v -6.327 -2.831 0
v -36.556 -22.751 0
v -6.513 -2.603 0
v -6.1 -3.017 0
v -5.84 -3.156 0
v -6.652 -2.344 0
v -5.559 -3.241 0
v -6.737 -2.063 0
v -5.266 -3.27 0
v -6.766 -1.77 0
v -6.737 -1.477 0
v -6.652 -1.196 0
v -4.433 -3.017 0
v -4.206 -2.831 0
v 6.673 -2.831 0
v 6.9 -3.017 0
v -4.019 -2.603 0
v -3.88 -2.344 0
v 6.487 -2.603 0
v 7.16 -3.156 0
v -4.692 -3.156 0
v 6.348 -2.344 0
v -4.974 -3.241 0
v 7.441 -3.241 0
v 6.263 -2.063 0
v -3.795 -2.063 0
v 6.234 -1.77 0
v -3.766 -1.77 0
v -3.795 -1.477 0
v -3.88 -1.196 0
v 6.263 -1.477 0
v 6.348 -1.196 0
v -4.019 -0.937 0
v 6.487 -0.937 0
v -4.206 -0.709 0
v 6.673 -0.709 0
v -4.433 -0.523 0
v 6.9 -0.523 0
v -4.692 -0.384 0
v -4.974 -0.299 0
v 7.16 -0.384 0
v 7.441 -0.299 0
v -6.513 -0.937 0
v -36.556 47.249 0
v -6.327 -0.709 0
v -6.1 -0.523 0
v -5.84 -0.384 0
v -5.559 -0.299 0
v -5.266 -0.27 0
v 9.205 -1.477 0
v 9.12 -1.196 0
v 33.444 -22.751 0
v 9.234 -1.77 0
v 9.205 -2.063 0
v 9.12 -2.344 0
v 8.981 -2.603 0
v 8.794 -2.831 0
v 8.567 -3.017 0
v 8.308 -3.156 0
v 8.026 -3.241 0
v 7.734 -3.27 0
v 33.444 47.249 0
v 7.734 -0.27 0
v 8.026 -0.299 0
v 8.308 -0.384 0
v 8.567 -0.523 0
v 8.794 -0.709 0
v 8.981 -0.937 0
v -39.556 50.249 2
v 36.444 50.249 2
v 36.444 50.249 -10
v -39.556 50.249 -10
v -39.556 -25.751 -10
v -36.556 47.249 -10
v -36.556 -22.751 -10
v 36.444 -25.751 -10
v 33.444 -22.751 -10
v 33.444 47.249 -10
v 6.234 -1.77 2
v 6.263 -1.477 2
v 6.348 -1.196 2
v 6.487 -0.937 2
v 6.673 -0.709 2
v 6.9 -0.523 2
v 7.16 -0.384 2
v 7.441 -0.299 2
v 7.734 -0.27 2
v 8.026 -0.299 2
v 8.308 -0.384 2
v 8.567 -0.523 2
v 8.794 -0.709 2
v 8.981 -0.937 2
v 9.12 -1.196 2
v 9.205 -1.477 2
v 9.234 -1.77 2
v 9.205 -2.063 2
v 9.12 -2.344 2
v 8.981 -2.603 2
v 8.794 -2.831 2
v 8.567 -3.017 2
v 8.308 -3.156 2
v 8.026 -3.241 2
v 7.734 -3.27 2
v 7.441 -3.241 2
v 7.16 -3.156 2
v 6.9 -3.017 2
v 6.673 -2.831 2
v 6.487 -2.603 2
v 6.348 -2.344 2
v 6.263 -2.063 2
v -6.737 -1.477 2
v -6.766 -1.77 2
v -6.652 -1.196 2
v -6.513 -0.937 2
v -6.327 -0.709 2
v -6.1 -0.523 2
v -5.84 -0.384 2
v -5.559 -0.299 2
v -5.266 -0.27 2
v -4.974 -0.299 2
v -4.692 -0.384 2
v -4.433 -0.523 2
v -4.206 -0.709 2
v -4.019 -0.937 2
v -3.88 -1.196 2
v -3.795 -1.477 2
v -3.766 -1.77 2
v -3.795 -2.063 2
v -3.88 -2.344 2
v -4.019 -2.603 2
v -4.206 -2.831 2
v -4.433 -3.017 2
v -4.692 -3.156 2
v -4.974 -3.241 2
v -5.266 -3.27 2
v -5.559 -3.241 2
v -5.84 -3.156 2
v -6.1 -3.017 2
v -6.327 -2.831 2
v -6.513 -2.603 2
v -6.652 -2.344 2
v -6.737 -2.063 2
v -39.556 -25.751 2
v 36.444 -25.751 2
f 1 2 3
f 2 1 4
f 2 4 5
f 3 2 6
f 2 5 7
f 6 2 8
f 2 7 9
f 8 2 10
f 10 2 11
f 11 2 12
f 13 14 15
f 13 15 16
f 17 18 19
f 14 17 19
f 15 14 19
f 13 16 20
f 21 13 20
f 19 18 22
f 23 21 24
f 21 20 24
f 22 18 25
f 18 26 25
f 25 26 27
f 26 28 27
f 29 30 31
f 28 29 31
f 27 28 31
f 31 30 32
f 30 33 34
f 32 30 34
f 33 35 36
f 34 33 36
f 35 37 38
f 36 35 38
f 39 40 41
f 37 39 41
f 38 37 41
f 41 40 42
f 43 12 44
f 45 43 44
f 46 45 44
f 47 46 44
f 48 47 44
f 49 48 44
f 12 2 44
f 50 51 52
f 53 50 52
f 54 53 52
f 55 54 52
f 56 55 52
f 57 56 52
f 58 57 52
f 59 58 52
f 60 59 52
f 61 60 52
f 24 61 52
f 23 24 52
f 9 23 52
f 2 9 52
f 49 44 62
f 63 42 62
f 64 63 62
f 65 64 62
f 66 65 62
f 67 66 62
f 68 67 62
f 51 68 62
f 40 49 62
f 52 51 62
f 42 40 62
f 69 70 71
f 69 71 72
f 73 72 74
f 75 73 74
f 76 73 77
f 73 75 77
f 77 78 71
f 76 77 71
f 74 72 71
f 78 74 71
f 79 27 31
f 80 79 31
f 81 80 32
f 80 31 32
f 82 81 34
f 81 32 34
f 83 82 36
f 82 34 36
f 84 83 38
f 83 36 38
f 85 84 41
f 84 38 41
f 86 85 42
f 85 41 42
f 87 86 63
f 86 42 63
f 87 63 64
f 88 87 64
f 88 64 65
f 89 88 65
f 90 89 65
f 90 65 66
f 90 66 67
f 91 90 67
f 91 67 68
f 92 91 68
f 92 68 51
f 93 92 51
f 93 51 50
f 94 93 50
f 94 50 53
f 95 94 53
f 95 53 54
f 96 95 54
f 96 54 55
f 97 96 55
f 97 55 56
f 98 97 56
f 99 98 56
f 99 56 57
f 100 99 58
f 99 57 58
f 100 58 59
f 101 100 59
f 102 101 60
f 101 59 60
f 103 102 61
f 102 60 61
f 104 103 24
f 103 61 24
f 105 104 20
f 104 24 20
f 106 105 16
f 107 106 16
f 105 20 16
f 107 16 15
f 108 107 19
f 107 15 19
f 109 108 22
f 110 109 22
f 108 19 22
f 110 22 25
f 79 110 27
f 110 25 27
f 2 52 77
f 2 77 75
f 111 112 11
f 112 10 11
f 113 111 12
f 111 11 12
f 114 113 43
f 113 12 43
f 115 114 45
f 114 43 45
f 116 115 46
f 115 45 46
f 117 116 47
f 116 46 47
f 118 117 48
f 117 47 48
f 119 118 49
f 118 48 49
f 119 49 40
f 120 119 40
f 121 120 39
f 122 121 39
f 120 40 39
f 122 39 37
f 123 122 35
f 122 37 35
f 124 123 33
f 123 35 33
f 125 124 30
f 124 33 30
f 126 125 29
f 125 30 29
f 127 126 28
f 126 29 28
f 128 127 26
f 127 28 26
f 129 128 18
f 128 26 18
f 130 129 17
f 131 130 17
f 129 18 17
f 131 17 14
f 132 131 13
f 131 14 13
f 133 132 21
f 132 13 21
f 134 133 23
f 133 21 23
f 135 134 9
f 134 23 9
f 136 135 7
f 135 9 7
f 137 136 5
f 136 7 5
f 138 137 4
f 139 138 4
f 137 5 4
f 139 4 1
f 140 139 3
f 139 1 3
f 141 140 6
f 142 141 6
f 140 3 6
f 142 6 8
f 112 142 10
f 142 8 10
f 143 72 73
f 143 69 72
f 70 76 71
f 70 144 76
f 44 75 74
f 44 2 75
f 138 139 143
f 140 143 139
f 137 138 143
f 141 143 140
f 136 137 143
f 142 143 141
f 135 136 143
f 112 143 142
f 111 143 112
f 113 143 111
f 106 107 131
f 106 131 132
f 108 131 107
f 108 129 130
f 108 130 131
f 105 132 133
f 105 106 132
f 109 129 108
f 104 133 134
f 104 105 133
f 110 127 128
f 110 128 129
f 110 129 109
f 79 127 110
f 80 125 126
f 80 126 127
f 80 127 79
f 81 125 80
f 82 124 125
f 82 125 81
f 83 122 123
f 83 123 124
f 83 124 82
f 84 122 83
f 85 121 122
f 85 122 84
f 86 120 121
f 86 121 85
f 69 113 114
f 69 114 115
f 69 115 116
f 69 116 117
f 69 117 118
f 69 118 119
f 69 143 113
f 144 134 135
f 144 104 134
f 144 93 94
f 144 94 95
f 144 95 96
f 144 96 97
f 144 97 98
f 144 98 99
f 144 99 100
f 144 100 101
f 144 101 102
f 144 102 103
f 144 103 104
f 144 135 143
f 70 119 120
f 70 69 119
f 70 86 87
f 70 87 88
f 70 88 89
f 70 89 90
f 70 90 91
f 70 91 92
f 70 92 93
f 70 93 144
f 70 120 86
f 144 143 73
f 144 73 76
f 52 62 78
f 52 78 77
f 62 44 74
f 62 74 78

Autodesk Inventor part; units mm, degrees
ref_plane "YZ Plane" through (0, 0, 0) normal (1, 0, 0) x (0, 1, 0)
ref_plane "XZ Plane" through (0, 0, 0) normal (0, 1, 0) x (-1, 0, 0)
ref_plane "XY Plane" through (0, 0, 0) normal (0, 0, 1) x (1, 0, 0)
sketch "Boceto4" plane through (0, 0, 0) normal (0, 0, 1) x (1, 0, 0)
  circle A0 centre (-1.0562, 12.2493) radius 5 projected
  line L0 (33.4438, -22.7507) -> (-36.5562, -22.7507) projected
  line L1 (33.4438, 47.2493) -> (33.4438, -22.7507) projected
  line L2 (-36.5562, 47.2493) -> (33.4438, 47.2493) projected
  line L3 (-36.5562, -22.7507) -> (-36.5562, 47.2493) projected
  circle A1 centre (21.3438, 12.2493) radius 3.7 projected
  circle A2 centre (-23.4562, 12.2493) radius 3.7 projected
  line L4 (36.4438, 50.2493) -> (-39.5562, 50.2493) projected
  line L5 (-39.5562, 50.2493) -> (-39.5562, -25.7507) projected
  line L6 (-39.5562, -25.7507) -> (36.4438, -25.7507) projected
  line L7 (36.4438, -25.7507) -> (36.4438, 50.2493) projected
  line L8 (33.4438, -22.7507) -> (-36.5562, -22.7507) projected
  line L9 (-36.5562, -22.7507) -> (-36.5562, 47.2493) projected
  line L10 (-36.5562, 47.2493) -> (33.4438, 47.2493) projected
  line L11 (33.4438, 47.2493) -> (33.4438, -22.7507) projected
  point P0 (0, 0)
extrude "Extrusión4" add sketch "Boceto4" against normal blind 10 contours L7 L6 L5 L4
sketch "Boceto5" plane through (0, 0, 0) normal (0, 0, 1) x (1, 0, 0)
  line L0 (-39.5562, 50.2493) -> (-39.5562, -25.7507) projected
  line L1 (-39.5562, -25.7507) -> (36.4438, -25.7507) projected
  line L2 (36.4438, -25.7507) -> (36.4438, 50.2493) projected
  line L3 (36.4438, 50.2493) -> (-39.5562, 50.2493) projected
  line L4 (-36.5562, -22.7507) -> (-36.5562, 47.2493) projected
  line L5 (-36.5562, 47.2493) -> (33.4438, 47.2493) projected
  line L6 (33.4438, 47.2493) -> (33.4438, -22.7507) projected
  line L7 (33.4438, -22.7507) -> (-36.5562, -22.7507) projected
  circle A0 centre (-1.0562, 12.2493) radius 5 projected
  line L8 (33.4438, -22.7507) -> (-36.5562, -22.7507) projected
  line L9 (33.4438, 47.2493) -> (33.4438, -22.7507) projected
  line L10 (-36.5562, 47.2493) -> (33.4438, 47.2493) projected
  line L11 (-36.5562, -22.7507) -> (-36.5562, 47.2493) projected
  circle A1 centre (21.3438, 12.2493) radius 3.7 projected
  circle A2 centre (-23.4562, 12.2493) radius 3.7 projected
  point P0 (0, 0)
extrude "Extrusión5" add sketch "Boceto5" along normal blind 2 contours L3 L2 L1 L0 | L4 L5 L6 L7
sketch "Boceto6" plane through (0, 0, 0) normal (0, 0, -1) x (-1, 0, 0)
  line L0 (39.5562, 50.2493) -> (-36.4438, 50.2493) projected
  line L1 (-36.4438, 50.2493) -> (-36.4438, -25.7507) projected
  line L2 (-36.4438, -25.7507) -> (39.5562, -25.7507) projected
  line L3 (39.5562, -25.7507) -> (39.5562, 50.2493) projected
  circle A0 centre (1.0562, 12.2493) radius 5 projected
  circle A1 centre (-21.3438, 12.2493) radius 3.7 projected
  circle A2 centre (23.4562, 12.2493) radius 3.7 projected
  circle A3 centre (5.2662, -1.7699) radius 1.5 projected
  circle A4 centre (-7.7338, -1.7699) radius 1.5 projected
  point P0 (0, 0)
extrude "Extrusión6" add sketch "Boceto6" against normal blind 2 contours A0 | A1 | A2
sketch "Boceto8" plane through (0, 0, 0) normal (0, 0, -1) x (-1, 0, 0)
  circle A0 centre (5.2662, -1.7699) radius 1.5 projected
  circle A1 centre (-7.7338, -1.7699) radius 1.5 projected
  point P0 (0, 0)
extrude "Extrusión7" cut sketch "Boceto8" against normal blind 2
properties part number "sensor_estructura"
